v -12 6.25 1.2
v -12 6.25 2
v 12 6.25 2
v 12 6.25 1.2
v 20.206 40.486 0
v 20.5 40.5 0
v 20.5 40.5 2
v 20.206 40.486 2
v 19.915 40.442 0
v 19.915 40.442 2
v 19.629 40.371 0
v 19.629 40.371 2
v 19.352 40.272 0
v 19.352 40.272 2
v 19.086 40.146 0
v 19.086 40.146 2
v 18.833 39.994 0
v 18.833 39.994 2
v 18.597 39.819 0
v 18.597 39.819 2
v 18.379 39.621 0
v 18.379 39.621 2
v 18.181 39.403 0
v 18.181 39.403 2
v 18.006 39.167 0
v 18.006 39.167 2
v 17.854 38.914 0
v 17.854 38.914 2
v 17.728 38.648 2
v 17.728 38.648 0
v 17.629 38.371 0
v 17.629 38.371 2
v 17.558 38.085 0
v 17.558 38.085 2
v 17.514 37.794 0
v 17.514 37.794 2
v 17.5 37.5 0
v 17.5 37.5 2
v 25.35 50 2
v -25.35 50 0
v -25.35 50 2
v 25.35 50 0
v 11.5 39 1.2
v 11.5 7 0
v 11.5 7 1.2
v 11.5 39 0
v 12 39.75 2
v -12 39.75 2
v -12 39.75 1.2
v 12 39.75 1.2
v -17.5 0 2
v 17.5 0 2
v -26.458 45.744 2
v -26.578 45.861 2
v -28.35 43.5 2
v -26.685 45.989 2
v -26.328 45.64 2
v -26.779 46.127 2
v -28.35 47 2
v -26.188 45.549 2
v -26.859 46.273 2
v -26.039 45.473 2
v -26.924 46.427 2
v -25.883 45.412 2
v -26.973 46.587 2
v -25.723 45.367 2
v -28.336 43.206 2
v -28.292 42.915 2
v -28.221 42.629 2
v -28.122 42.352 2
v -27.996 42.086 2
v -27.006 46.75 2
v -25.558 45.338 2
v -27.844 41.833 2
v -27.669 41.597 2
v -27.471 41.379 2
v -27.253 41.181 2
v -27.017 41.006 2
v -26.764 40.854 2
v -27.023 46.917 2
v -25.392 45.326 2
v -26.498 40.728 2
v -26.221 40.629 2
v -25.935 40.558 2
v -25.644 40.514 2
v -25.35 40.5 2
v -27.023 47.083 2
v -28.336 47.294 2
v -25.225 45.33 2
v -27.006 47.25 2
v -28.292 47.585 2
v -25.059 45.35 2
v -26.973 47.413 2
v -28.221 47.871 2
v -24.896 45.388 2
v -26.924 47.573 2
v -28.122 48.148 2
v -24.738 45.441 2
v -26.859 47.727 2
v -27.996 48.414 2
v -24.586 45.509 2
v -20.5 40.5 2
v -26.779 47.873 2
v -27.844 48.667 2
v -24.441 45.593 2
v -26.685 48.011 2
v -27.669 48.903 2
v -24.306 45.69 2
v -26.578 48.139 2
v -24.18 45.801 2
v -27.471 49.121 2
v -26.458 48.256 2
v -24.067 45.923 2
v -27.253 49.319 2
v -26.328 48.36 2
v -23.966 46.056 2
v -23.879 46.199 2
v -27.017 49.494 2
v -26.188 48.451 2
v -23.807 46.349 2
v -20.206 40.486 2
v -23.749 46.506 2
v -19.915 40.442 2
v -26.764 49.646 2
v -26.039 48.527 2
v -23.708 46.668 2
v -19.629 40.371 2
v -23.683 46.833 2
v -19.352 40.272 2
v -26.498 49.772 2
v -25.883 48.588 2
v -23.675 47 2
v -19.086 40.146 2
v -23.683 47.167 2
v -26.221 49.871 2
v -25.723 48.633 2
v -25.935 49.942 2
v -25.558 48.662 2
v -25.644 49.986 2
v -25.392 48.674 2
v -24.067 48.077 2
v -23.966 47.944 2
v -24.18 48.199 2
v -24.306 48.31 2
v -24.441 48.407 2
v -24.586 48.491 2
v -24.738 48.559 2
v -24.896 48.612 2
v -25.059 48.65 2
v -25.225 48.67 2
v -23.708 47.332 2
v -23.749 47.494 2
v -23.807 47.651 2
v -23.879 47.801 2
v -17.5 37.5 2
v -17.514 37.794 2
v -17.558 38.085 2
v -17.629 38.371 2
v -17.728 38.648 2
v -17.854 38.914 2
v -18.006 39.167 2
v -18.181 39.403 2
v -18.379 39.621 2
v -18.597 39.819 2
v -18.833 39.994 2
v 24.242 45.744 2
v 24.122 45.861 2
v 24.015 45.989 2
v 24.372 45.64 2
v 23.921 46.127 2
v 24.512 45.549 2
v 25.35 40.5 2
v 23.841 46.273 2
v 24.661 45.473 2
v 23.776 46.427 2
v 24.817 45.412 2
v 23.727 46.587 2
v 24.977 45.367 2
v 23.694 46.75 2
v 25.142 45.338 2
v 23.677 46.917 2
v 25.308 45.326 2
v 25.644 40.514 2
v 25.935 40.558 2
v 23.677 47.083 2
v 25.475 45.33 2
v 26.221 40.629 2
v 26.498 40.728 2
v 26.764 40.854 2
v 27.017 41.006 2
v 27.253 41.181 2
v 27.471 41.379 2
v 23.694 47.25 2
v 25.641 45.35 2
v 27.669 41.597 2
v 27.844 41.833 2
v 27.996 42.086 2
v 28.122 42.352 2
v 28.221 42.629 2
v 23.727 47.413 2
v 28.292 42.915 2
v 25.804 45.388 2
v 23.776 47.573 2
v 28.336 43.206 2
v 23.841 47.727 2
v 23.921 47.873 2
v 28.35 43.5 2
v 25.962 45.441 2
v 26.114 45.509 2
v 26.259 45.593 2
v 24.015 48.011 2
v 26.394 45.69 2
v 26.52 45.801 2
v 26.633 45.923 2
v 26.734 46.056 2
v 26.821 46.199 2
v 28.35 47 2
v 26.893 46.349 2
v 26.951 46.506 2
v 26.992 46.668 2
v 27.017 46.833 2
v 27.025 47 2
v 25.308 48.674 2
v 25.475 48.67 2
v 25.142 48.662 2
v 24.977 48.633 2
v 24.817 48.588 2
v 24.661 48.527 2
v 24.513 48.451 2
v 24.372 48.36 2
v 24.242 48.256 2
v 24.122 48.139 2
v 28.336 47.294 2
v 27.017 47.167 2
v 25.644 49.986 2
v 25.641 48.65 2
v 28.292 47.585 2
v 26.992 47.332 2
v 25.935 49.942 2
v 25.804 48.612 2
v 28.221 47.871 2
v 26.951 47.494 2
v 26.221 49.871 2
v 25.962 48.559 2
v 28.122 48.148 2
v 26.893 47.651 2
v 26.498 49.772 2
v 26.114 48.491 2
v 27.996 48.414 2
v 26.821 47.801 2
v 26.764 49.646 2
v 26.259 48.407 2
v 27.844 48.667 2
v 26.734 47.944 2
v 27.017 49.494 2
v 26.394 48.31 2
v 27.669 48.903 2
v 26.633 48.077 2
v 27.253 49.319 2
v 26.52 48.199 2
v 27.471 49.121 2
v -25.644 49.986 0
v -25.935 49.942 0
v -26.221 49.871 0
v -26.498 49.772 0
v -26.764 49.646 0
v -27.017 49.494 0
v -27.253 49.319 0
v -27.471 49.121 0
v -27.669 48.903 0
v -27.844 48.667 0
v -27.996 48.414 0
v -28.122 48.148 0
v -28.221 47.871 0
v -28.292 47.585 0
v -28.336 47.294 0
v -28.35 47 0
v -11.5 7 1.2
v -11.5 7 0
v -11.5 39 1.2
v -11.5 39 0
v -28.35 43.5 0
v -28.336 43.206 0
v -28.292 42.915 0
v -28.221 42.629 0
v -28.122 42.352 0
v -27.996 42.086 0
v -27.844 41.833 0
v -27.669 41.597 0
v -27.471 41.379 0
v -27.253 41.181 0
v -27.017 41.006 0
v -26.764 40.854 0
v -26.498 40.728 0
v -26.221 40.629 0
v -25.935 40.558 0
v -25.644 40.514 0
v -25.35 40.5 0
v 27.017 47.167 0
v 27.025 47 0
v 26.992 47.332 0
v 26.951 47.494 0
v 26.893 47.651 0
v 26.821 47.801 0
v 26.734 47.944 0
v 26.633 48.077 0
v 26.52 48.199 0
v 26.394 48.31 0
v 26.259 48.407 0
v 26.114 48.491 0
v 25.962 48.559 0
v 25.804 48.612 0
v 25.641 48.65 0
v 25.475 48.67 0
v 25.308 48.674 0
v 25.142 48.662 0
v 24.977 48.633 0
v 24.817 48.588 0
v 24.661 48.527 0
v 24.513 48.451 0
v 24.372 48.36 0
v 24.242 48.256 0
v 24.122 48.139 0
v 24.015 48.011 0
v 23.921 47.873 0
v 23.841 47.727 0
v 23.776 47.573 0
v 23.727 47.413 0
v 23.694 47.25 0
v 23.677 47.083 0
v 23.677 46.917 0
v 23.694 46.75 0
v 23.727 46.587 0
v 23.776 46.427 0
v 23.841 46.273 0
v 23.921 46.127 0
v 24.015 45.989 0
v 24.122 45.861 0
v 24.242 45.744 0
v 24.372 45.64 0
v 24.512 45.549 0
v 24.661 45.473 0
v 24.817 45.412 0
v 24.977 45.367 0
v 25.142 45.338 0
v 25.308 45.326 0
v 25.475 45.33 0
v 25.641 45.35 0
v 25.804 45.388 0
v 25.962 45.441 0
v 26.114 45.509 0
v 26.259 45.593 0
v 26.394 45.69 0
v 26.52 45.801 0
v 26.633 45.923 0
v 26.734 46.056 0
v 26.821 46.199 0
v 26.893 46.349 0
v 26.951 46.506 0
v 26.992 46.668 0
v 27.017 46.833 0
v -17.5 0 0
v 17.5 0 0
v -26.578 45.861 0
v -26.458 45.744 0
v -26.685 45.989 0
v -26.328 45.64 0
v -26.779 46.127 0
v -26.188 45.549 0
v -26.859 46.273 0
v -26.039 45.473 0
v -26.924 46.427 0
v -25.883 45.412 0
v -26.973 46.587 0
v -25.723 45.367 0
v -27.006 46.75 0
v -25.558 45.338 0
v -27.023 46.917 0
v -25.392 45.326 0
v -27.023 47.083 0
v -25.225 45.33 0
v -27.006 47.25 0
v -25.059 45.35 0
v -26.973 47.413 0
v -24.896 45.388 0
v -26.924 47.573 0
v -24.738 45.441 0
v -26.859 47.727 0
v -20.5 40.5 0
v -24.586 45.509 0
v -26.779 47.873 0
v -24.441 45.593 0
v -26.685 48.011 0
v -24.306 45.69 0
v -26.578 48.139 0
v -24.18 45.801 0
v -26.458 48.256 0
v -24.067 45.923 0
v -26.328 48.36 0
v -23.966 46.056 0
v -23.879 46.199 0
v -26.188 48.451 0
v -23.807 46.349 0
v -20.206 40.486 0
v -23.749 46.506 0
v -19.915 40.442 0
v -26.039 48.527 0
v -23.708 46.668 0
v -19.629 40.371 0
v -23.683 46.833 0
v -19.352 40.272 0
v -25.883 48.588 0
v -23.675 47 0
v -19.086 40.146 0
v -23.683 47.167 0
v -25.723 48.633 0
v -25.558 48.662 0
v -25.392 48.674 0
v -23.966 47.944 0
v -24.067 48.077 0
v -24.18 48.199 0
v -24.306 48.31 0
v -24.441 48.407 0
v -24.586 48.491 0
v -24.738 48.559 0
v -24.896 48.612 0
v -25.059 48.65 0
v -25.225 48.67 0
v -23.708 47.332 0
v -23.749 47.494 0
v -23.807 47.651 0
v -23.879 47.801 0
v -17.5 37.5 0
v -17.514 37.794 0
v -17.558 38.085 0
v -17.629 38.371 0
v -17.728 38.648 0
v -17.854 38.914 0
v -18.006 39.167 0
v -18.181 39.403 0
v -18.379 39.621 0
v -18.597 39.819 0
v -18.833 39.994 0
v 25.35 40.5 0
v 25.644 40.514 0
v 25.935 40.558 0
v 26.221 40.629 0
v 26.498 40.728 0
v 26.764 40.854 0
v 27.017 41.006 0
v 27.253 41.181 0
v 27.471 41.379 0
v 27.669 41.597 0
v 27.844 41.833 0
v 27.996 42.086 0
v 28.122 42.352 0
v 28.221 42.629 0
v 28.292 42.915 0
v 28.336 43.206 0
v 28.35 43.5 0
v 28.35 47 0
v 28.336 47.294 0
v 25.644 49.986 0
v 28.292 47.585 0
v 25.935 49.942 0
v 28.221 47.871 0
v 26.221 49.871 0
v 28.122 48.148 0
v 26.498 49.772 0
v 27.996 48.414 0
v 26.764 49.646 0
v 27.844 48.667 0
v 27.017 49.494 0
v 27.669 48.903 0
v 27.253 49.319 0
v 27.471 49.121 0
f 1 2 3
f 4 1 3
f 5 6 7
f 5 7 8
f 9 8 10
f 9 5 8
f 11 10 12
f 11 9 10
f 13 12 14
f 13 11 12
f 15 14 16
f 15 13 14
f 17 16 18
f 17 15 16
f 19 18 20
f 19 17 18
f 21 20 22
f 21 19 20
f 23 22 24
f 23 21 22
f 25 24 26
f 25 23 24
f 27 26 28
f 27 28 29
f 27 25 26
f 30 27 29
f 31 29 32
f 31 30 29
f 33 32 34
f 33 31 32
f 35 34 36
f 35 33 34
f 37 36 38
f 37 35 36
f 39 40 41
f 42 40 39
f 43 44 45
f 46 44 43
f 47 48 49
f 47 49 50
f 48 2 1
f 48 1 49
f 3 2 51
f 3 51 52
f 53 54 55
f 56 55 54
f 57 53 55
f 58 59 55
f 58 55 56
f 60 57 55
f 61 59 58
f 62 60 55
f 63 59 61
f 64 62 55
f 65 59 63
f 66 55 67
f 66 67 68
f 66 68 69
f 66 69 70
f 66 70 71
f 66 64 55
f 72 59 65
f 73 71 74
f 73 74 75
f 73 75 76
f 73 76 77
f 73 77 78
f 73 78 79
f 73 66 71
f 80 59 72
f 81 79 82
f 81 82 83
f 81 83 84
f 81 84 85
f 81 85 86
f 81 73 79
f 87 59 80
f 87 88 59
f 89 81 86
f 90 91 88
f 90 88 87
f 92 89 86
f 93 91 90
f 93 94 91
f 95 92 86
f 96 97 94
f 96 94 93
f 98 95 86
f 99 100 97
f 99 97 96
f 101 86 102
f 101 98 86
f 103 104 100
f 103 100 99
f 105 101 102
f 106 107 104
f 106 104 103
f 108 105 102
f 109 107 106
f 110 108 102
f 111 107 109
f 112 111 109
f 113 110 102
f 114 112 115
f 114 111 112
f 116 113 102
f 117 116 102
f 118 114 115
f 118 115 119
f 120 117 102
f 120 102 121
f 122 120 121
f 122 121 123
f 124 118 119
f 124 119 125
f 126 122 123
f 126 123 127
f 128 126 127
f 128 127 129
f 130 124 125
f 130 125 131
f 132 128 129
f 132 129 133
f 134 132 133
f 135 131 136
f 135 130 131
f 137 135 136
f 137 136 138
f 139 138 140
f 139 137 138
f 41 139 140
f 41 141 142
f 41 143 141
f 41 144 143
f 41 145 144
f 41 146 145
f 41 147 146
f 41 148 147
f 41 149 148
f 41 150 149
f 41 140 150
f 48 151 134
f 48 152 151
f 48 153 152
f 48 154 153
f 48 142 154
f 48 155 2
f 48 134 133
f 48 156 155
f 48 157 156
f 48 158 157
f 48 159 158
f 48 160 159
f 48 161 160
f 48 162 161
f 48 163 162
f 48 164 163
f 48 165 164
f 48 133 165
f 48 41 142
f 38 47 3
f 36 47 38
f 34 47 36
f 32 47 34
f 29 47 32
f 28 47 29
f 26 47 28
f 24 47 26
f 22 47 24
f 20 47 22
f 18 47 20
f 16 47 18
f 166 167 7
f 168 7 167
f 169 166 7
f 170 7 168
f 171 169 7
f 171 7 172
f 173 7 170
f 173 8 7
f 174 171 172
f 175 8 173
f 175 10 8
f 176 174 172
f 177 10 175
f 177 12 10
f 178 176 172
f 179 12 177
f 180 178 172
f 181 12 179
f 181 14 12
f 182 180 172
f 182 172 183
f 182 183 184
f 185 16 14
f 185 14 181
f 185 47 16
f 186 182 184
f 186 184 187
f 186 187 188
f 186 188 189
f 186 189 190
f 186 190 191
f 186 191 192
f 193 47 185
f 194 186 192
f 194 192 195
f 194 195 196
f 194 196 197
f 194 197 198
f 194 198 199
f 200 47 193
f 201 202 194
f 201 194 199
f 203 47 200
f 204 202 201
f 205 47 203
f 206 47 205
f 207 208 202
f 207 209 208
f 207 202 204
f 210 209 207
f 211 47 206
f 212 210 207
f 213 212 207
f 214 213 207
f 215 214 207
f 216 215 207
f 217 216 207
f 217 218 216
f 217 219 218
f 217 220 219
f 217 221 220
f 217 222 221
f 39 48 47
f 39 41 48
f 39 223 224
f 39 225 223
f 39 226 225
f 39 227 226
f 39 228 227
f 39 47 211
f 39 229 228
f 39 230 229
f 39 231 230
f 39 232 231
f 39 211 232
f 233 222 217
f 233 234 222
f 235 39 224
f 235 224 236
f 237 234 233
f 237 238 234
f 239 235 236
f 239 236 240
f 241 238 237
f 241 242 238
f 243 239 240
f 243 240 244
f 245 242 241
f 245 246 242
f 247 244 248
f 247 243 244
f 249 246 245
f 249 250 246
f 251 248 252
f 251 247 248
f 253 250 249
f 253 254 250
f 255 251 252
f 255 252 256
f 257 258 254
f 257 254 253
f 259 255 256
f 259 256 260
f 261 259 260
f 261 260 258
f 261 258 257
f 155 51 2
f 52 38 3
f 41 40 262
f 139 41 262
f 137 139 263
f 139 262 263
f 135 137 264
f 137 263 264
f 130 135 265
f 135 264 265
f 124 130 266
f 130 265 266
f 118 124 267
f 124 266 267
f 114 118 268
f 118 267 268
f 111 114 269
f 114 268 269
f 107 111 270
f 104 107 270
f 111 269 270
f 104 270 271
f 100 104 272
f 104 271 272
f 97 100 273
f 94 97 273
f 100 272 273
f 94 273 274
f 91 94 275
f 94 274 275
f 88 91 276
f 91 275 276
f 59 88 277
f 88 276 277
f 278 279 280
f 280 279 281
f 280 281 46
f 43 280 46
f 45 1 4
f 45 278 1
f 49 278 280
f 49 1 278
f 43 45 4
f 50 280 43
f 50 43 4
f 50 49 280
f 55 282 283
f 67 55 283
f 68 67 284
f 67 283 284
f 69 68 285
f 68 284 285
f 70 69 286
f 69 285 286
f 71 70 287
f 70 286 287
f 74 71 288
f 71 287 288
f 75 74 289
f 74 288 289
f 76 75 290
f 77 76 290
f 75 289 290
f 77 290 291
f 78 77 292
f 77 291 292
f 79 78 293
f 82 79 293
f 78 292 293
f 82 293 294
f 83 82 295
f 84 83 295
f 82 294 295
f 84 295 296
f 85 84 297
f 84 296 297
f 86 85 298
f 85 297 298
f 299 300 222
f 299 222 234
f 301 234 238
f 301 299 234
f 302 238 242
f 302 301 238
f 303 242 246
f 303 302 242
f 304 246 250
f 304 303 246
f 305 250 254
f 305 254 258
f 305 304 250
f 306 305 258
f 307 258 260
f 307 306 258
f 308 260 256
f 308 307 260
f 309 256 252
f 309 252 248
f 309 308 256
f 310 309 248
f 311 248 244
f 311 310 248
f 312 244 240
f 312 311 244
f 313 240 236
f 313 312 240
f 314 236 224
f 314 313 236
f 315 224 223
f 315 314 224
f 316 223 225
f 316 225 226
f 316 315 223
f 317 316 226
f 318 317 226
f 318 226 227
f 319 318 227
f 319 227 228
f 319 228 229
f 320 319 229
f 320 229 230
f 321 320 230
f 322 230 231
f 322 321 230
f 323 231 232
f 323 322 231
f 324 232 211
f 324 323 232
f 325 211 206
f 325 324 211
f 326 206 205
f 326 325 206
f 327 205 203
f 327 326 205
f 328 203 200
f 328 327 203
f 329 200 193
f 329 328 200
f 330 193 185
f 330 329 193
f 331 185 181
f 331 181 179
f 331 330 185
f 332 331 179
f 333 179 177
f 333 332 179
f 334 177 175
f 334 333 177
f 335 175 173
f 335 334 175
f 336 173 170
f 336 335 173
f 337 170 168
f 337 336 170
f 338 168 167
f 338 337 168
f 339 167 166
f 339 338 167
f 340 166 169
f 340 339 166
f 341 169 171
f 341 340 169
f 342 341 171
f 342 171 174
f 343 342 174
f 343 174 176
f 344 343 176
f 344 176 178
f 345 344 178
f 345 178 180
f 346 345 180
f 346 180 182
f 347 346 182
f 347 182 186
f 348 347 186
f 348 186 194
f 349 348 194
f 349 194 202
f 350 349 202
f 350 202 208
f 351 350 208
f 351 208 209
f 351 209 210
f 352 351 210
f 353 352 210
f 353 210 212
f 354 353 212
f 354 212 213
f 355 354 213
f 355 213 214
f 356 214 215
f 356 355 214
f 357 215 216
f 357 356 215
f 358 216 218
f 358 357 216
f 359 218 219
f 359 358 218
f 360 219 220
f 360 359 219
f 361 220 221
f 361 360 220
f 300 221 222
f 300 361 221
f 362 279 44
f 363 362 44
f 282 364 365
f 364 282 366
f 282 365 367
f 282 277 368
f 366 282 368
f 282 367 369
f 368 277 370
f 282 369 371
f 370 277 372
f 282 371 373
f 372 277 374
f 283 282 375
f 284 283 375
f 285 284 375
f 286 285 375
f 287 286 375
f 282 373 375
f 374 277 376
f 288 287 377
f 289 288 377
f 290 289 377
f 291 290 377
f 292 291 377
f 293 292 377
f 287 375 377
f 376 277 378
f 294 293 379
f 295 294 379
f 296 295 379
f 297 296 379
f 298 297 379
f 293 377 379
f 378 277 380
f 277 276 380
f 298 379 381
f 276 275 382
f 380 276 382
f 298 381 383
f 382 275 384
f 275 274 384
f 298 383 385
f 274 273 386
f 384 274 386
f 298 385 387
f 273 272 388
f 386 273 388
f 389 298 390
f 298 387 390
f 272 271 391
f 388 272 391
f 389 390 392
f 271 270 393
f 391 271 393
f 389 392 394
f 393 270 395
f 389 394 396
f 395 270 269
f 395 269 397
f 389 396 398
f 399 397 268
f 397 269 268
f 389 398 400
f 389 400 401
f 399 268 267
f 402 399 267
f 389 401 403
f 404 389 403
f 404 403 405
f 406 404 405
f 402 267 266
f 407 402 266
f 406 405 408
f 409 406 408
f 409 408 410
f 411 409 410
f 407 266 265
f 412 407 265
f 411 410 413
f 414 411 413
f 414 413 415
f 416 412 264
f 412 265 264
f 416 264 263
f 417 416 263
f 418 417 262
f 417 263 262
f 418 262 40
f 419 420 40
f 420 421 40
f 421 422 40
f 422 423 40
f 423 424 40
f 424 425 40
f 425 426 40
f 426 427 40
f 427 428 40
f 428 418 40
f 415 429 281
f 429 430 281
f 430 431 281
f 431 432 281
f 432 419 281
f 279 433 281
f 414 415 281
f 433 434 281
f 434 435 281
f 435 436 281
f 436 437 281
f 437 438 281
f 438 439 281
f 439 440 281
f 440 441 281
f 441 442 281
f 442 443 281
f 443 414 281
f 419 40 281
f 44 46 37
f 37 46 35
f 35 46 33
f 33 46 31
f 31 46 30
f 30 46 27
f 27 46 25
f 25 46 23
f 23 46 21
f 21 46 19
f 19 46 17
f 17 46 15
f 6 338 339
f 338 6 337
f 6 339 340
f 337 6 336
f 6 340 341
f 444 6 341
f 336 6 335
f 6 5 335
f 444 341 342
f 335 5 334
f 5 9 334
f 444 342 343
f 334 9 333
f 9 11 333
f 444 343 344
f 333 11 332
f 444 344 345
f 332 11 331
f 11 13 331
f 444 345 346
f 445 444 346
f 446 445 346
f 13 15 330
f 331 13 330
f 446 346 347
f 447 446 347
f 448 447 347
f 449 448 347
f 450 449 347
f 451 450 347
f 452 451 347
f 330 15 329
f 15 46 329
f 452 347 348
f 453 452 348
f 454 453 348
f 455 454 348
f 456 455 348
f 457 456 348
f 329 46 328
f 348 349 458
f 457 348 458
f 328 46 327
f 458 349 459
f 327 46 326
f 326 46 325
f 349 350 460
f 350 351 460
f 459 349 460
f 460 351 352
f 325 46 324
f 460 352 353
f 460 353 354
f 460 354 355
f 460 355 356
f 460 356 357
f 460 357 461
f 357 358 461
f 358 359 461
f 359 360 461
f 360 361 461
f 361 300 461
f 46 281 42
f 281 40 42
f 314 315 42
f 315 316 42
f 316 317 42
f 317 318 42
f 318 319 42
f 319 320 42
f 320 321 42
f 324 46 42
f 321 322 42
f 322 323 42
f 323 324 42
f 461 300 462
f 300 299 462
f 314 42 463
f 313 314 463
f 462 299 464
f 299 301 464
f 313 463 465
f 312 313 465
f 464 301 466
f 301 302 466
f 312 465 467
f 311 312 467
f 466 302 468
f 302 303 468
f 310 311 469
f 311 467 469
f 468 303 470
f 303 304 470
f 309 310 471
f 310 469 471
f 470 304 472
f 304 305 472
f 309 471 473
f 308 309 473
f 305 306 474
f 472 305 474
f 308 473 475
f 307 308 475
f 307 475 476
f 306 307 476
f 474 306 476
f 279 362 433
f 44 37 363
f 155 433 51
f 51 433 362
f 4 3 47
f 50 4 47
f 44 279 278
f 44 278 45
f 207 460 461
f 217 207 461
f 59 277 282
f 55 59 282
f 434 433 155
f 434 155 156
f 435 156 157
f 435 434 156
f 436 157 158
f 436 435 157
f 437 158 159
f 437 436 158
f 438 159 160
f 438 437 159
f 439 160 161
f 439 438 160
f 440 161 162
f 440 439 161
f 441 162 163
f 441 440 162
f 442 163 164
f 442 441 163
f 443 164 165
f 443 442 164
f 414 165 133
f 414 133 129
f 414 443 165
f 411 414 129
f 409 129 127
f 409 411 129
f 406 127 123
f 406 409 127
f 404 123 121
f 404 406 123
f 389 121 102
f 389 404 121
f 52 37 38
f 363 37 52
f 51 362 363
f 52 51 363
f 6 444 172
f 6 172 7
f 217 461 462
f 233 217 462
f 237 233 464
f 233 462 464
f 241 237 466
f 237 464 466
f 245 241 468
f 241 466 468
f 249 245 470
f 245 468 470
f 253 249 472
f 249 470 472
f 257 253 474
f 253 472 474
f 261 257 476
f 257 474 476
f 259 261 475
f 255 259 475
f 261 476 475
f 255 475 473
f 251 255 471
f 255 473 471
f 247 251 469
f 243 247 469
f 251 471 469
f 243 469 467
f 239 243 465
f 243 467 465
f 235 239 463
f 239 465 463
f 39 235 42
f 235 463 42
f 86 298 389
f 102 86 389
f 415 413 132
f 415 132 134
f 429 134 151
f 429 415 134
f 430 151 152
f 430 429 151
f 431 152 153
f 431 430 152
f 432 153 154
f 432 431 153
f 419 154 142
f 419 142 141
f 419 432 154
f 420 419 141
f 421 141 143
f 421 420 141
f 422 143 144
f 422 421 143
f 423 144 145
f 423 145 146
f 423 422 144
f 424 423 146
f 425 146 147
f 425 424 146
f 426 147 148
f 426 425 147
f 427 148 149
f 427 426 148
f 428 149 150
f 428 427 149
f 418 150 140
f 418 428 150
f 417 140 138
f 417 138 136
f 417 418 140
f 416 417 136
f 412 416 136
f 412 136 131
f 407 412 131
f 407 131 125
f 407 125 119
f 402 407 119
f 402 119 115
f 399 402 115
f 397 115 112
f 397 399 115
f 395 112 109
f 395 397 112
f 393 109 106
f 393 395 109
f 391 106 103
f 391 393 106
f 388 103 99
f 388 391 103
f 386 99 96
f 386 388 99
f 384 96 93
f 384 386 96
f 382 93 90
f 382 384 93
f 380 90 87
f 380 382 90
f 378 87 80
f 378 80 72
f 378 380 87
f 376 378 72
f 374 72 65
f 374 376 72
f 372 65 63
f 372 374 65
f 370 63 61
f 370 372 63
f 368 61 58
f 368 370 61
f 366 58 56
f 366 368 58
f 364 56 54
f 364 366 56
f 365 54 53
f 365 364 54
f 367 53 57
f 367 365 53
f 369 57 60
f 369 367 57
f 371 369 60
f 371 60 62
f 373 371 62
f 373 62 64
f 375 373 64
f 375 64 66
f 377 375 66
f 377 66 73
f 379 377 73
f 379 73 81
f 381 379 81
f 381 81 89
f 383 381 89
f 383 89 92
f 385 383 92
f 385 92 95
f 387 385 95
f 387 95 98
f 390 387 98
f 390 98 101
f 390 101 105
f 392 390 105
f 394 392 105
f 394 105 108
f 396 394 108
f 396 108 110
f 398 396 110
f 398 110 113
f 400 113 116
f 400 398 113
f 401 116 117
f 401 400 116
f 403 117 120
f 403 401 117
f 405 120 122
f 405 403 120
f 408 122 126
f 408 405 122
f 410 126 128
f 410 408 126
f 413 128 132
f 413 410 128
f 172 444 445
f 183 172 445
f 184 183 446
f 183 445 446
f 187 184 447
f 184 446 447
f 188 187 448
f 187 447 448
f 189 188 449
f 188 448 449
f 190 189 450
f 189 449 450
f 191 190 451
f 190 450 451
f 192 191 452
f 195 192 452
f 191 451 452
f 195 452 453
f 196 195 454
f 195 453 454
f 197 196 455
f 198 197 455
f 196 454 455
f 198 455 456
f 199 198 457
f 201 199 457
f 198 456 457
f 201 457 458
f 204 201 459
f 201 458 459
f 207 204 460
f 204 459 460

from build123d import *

# Parameters (mm, degrees)
SKETCH_R     = 1.675
SKETCH_W     = 23
SKETCH_H     = 32
PAD_DEPTH    = 2
SKETCH001_W  = 24
SKETCH001_H  = 33.5
POCKET_DEPTH = 0.8


with BuildPart() as part:
    # Sketch → Pad (new body)
    with BuildSketch(Plane.XY):
        with BuildLine():
            ThreePointArc((-25.35, 50), (-27.471328, 49.121313), (-28.35, 46.999979))
            Line((-28.35, 46.999979), (-28.35, 43.499979))
            ThreePointArc((-28.35, 43.499979), (-27.47132, 41.378659), (-25.35, 40.499979))
            Line((-25.35, 40.499979), (-20.5, 40.499979))
            ThreePointArc((-17.5, 37.499979), (-18.37868, 39.6213), (-20.5, 40.499979))
            Line((-17.5, 37.499979), (-17.5, 0))
            Line((-17.5, 0), (17.5, 0))
            Line((17.5, 37.499979), (17.5, 0))
            ThreePointArc((20.5, 40.499979), (18.37868, 39.6213), (17.5, 37.499979))
            Line((25.35, 40.499979), (20.5, 40.499979))
            ThreePointArc((25.35, 40.499979), (27.47132, 41.378659), (28.35, 43.499979))
            Line((28.35, 43.499979), (28.35, 46.999979))
            ThreePointArc((28.35, 46.999979), (27.471328, 49.121313), (25.35, 50))
            Line((-25.35, 50), (25.35, 50))
        make_face()
        with Locations((-25.35, 47)):
            Circle(SKETCH_R, mode=Mode.SUBTRACT)
        with Locations((25.35, 47)):
            Circle(SKETCH_R, mode=Mode.SUBTRACT)
        with Locations((0, 23)):
            Rectangle(SKETCH_W, SKETCH_H, mode=Mode.SUBTRACT)
    extrude(amount=PAD_DEPTH)

    # Sketch001 → Pocket (cut)
    with BuildSketch(Plane.XY.offset(2)):
        with Locations((0, 23)):
            Rectangle(SKETCH001_W, SKETCH001_H)
    extrude(amount=-POCKET_DEPTH, mode=Mode.SUBTRACT)


solid = part.part
